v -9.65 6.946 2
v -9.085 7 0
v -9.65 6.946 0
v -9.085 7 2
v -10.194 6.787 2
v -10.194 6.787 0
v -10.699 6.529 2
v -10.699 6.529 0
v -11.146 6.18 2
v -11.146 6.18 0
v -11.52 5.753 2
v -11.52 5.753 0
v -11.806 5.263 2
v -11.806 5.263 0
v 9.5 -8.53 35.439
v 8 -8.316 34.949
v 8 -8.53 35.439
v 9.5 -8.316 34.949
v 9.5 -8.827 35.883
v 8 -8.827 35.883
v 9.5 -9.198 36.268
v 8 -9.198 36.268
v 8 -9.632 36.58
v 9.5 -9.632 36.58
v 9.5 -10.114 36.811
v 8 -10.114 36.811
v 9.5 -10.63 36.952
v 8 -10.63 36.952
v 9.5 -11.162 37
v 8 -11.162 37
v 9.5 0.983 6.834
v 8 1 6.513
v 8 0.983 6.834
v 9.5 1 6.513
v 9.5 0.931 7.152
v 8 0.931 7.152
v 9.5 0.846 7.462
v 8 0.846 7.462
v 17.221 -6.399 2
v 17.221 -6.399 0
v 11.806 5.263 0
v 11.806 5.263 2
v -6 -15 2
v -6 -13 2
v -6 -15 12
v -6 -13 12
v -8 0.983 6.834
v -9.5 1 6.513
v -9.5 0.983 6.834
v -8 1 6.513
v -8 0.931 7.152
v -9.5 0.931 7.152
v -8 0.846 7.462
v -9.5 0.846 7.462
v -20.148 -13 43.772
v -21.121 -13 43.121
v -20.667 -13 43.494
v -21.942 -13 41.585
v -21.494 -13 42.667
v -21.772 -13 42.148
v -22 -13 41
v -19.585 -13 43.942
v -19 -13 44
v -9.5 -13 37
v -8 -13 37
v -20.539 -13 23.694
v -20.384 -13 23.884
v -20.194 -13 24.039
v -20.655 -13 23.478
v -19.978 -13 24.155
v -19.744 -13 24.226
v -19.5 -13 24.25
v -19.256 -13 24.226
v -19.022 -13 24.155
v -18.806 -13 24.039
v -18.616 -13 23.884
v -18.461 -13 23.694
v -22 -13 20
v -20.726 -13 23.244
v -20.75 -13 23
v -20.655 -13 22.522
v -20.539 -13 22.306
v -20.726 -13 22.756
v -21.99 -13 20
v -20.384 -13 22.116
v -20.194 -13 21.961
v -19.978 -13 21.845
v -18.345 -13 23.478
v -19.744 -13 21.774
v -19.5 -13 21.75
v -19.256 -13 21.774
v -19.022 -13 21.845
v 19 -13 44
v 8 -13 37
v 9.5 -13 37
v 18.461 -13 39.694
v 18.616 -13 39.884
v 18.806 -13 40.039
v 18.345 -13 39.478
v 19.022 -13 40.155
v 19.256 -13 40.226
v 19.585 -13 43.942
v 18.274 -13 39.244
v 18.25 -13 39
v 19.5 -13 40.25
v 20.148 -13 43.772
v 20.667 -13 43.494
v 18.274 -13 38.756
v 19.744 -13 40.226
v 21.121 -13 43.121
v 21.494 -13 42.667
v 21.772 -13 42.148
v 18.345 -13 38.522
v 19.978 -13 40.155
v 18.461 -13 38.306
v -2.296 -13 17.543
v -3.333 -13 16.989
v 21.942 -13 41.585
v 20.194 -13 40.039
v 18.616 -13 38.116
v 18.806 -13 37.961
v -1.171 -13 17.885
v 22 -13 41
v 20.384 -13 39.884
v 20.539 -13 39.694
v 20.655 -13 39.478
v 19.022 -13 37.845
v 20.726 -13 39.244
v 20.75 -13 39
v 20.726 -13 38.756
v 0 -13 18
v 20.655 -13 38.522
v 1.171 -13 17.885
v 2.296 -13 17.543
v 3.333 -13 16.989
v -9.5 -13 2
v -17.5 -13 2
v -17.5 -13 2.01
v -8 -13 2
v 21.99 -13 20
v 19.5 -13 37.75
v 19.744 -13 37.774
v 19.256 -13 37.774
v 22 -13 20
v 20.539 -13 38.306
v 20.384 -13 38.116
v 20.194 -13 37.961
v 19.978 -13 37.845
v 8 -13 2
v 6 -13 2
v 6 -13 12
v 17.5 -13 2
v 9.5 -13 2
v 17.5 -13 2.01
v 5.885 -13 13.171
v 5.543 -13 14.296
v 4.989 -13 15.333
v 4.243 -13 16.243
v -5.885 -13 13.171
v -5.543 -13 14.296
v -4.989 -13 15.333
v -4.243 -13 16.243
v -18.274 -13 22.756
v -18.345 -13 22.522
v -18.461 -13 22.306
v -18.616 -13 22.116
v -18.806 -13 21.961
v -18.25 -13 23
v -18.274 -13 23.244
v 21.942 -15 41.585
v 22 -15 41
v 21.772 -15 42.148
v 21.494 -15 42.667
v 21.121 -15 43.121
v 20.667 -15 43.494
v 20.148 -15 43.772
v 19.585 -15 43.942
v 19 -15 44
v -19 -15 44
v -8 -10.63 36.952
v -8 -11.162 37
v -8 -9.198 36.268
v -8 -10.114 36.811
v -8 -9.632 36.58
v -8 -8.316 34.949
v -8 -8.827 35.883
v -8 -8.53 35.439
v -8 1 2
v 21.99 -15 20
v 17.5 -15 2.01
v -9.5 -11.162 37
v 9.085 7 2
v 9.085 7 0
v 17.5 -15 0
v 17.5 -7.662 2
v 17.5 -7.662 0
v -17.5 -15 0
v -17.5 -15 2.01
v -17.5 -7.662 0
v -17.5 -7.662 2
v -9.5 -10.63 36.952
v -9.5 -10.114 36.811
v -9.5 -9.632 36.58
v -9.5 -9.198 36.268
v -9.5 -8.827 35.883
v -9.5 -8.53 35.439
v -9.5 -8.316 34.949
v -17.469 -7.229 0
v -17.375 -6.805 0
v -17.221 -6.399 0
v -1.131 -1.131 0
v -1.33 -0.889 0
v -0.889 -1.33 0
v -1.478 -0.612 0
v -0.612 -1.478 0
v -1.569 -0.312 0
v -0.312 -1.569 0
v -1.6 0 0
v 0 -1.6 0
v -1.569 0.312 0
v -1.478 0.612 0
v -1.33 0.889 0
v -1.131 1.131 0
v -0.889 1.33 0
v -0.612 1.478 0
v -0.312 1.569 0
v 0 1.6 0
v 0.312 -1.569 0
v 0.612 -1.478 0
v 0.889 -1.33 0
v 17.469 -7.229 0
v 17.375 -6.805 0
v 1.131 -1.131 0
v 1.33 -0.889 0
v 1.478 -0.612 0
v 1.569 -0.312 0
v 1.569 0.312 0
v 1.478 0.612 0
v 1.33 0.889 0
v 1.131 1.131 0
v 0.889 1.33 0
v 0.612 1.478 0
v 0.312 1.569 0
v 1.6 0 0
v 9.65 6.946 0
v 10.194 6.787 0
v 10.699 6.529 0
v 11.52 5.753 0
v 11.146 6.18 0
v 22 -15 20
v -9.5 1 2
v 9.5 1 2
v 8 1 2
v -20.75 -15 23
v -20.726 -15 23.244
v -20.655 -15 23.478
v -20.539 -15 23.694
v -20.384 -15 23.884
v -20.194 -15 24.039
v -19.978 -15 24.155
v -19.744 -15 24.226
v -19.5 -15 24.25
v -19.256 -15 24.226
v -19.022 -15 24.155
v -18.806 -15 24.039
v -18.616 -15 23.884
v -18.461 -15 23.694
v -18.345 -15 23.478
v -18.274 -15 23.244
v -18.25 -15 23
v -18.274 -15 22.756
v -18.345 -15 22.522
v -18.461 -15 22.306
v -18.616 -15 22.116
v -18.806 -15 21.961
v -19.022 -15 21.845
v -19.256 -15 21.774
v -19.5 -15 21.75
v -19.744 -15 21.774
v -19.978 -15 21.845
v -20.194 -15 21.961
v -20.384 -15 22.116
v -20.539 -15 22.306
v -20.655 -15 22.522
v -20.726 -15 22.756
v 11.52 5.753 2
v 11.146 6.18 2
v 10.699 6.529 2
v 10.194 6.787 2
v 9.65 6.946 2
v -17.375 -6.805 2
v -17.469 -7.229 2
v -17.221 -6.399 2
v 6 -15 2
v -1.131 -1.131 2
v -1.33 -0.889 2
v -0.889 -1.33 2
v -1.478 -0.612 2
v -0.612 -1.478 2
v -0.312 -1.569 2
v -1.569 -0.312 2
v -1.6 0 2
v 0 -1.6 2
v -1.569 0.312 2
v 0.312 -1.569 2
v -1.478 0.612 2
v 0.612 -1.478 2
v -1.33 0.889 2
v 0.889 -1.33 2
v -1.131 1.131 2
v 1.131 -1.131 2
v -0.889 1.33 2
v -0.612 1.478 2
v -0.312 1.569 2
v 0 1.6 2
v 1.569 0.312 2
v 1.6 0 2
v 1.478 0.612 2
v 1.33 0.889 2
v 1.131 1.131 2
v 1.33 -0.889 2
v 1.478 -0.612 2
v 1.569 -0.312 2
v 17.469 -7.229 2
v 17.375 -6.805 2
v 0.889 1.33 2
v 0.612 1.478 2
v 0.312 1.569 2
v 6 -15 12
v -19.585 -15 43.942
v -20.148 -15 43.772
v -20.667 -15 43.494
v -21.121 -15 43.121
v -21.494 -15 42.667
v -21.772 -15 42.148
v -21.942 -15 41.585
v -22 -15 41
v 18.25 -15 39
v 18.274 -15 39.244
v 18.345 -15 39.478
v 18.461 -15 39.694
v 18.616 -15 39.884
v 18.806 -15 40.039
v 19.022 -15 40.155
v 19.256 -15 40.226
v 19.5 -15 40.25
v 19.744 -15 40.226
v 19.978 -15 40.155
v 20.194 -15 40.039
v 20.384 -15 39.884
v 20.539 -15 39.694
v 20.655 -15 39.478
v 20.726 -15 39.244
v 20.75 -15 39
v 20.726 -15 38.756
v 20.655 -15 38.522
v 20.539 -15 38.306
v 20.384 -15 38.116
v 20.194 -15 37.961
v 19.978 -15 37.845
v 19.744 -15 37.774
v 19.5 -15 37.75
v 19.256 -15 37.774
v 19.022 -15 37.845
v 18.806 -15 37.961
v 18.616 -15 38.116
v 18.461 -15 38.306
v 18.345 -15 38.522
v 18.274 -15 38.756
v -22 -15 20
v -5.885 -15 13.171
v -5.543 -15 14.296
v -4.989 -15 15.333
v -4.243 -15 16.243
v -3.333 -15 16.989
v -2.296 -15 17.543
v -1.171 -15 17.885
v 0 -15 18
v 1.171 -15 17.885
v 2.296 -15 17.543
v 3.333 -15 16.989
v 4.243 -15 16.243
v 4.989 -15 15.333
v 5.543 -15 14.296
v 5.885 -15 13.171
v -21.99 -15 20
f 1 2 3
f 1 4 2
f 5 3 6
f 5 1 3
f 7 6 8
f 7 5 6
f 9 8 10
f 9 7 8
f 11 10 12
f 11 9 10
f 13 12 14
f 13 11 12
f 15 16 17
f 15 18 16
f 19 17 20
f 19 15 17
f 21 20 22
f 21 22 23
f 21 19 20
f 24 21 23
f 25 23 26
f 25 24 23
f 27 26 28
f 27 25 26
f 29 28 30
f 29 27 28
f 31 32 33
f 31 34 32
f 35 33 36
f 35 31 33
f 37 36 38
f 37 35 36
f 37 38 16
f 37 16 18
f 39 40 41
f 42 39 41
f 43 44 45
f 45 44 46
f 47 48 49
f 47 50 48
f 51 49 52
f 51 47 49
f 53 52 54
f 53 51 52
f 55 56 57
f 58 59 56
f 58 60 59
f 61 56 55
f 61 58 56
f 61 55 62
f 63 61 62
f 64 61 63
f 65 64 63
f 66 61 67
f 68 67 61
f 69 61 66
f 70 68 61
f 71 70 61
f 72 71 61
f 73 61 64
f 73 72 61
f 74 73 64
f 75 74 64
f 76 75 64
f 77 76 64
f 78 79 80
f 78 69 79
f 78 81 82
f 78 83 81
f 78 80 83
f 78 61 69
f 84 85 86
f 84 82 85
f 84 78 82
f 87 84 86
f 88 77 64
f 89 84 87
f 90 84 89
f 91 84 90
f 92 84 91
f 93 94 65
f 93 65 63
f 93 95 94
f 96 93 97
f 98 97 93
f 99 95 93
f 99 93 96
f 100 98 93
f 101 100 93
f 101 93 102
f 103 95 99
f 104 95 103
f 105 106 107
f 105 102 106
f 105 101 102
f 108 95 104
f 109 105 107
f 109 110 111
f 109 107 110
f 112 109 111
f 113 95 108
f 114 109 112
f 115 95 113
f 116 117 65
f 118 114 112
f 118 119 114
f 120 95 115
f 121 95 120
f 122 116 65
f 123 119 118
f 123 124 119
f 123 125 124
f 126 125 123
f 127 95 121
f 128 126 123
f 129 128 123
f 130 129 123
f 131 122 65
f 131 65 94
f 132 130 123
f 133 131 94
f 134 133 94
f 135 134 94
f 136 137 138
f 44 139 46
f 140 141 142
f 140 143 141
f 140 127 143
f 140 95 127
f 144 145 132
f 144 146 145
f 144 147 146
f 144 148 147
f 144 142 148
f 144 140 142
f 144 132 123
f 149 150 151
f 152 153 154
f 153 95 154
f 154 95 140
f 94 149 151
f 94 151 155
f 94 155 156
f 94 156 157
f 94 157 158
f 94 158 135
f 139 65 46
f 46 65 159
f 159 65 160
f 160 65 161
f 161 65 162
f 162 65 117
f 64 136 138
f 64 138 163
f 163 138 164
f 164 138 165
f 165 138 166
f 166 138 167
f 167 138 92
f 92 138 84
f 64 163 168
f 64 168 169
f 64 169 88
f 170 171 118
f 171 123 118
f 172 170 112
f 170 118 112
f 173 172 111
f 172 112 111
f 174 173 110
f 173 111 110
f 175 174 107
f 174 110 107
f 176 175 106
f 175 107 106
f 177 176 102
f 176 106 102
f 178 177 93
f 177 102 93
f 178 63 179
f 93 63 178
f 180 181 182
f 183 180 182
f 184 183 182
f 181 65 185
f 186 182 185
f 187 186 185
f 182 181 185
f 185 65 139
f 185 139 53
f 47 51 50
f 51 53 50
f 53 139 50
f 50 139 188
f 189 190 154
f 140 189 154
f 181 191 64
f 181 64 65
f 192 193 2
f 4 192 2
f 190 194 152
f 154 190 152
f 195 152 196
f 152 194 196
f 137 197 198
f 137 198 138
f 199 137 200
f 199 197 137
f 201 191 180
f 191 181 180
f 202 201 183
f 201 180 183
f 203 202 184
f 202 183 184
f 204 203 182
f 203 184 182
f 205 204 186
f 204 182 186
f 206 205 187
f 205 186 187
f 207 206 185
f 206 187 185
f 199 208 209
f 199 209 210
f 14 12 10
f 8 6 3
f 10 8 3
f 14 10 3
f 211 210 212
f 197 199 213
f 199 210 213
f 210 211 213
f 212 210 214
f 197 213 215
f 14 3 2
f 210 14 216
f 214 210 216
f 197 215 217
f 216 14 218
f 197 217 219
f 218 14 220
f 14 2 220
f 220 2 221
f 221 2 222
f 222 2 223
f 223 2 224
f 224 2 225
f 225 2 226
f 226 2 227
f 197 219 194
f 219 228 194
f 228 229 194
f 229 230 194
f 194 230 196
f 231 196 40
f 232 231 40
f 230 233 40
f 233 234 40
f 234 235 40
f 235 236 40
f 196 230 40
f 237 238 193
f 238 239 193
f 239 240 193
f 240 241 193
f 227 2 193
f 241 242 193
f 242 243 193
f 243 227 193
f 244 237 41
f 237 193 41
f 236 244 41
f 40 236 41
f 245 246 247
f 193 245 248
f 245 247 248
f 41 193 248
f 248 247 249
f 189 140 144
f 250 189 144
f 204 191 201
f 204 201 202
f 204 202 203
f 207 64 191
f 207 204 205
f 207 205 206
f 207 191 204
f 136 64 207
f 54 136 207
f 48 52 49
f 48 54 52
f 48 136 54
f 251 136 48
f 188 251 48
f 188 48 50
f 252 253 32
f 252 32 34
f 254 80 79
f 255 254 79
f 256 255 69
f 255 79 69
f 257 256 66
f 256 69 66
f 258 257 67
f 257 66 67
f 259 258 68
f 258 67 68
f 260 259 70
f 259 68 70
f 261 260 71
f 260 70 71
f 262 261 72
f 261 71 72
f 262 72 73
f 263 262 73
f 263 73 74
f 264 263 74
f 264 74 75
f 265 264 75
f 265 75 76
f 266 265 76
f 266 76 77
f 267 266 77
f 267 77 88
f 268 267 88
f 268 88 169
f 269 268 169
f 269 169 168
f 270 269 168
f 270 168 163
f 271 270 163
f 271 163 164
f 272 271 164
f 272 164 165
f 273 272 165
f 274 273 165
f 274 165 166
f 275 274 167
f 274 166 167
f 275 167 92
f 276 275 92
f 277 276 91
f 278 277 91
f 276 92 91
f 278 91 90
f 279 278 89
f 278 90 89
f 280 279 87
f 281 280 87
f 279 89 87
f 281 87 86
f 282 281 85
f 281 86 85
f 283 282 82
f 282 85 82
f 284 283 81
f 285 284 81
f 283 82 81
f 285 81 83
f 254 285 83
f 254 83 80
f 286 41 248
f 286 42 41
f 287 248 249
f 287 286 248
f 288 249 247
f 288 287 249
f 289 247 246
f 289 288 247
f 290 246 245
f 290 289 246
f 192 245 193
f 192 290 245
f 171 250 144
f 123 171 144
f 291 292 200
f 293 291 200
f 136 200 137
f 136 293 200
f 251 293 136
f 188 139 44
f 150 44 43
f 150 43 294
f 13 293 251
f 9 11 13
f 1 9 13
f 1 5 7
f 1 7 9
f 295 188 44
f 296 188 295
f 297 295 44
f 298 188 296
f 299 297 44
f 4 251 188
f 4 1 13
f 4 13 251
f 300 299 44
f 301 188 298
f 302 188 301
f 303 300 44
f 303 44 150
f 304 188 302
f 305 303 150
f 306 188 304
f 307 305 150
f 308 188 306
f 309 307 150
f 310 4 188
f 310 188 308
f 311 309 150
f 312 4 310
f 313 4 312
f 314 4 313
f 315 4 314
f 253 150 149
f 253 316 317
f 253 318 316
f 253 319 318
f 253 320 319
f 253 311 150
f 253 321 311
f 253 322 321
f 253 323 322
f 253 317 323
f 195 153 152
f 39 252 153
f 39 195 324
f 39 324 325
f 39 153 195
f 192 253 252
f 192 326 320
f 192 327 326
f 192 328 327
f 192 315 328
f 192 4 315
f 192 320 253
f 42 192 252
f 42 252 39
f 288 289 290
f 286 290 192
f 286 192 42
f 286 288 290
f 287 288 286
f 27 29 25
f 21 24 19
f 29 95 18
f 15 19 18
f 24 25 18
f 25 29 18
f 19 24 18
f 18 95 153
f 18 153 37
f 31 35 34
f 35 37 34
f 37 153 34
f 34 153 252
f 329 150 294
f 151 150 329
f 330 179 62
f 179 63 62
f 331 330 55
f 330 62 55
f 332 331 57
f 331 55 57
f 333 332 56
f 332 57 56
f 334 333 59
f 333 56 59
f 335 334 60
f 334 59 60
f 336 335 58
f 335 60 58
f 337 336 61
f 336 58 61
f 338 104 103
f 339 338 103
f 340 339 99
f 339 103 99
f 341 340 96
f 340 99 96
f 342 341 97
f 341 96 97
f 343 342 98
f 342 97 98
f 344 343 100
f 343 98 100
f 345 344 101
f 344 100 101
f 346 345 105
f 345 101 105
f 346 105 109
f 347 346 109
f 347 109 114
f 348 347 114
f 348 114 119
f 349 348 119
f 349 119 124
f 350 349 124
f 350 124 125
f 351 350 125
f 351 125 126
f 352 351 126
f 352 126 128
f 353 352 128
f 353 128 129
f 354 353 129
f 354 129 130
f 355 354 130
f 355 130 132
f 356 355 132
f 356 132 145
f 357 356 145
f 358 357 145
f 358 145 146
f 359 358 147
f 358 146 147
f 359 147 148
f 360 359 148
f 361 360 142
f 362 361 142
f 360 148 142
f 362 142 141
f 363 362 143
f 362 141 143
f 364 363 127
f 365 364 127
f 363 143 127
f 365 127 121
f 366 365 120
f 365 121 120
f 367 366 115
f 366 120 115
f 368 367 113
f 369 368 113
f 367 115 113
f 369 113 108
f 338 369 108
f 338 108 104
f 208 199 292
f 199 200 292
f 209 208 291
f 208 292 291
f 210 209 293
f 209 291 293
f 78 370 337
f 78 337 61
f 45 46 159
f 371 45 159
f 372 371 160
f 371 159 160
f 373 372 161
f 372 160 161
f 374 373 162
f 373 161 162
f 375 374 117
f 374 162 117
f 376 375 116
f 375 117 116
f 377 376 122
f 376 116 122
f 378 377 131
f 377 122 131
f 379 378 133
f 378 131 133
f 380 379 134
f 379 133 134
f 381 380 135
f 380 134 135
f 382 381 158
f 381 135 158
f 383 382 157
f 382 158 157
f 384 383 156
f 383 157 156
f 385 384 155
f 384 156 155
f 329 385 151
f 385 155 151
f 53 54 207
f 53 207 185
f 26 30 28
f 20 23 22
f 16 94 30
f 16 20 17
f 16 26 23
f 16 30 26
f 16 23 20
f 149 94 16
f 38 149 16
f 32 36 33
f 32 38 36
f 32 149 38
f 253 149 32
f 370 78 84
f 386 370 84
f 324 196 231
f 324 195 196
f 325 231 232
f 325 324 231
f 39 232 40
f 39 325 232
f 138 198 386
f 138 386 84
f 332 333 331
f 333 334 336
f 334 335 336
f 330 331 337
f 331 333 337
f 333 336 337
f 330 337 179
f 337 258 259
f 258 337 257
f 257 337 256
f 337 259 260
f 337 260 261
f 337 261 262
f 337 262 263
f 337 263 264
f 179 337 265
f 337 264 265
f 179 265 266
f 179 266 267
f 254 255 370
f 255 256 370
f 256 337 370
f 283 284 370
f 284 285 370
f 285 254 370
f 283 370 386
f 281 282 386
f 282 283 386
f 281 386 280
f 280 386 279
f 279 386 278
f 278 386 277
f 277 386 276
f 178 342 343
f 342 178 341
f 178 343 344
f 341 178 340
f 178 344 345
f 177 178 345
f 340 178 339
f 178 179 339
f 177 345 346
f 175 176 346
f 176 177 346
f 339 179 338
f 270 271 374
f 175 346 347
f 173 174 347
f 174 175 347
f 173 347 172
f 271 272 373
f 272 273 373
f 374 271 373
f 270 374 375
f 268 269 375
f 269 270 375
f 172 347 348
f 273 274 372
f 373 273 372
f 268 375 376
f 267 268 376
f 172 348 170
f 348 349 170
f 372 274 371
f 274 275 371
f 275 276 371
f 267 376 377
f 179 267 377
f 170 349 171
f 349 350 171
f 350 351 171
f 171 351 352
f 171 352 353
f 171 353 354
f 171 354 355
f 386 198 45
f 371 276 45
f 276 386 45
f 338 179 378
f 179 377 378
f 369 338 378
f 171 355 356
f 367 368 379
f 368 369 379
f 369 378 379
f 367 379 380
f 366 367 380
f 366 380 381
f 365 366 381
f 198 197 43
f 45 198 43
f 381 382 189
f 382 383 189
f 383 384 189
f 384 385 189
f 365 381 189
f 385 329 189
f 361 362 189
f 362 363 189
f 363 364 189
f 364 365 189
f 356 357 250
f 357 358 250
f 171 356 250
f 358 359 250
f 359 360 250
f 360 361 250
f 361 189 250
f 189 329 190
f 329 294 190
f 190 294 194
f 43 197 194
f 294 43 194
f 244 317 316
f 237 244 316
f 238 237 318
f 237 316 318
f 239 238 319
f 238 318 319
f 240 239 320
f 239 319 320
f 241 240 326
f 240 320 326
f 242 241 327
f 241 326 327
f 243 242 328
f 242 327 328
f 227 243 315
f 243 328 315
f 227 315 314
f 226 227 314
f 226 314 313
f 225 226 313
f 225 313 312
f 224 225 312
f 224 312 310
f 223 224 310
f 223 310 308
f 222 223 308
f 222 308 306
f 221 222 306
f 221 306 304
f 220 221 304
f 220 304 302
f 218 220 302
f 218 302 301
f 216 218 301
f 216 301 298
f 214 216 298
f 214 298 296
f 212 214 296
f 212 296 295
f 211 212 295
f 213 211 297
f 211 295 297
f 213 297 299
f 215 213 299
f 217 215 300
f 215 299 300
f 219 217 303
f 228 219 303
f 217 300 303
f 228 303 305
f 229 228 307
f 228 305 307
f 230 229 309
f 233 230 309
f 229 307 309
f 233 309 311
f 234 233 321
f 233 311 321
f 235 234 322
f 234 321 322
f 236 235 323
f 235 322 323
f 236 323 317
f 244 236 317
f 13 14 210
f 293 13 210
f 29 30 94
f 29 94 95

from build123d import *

# Parameters (mm, degrees)
PAD_DEPTH          = 2
SKETCH001_W        = 35
SKETCH001_H        = 2
PAD001_DEPTH       = 18
SKETCH002_W        = 44
SKETCH002_H        = 2
PAD002_DEPTH       = 24
CHAMFER_1_SIZE2    = 17.99
CHAMFER_1_SIZE     = 4.49
CHAMFER_2_SIZE2    = 17.99
CHAMFER_2_SIZE     = 4.49
FILLET_R           = 3
SKETCH003_R        = 1.25
POCKET_DEPTH       = 5
SKETCH004_R        = 1.6
POCKET001_DEPTH    = 5
SKETCH005_W        = 1.5
SKETCH005_H        = 14
PAD003_DEPTH       = 35
CHAMFER001_1_SIZE2 = 30
CHAMFER001_1_SIZE  = 10
CHAMFER001_2_SIZE2 = 30
CHAMFER001_2_SIZE  = 10
FILLET001_R        = 3
POCKET002_DEPTH    = 5


with BuildPart() as part:
    # Sketch → Pad (new body)
    with BuildSketch(Plane.XY):
        Polygon((-17.5, -15), (17.5, -15), (17.5, -7), (11, 7), (-11, 7), (-17.5, -7), align=None)
    extrude(amount=PAD_DEPTH)

    # Sketch001 (on Face8 of Pad) → Pad001 (join)
    with BuildSketch(Plane.XY.offset(2)):
        with Locations((0, -14)):
            Rectangle(SKETCH001_W, SKETCH001_H)
    extrude(amount=PAD001_DEPTH)

    # Sketch002 (on Face12 of Pad001) → Pad002 (join)
    with BuildSketch(Plane.XY.offset(20)):
        with Locations((0, -14)):
            Rectangle(SKETCH002_W, SKETCH002_H)
    extrude(amount=PAD002_DEPTH)

    # Chamfer 1
    chamfer_1_edges = [part.edges().sort_by_distance(p)[0] for p in [
        (-17.5, -14, 20),
    ]]
    chamfer_1_side = part.faces().sort_by_distance((-19.75, -14, 20))[0]
    chamfer(chamfer_1_edges, length=CHAMFER_1_SIZE, length2=CHAMFER_1_SIZE2, reference=chamfer_1_side)

    # Chamfer 2
    chamfer_2_edges = [part.edges().sort_by_distance(p)[0] for p in [
        (17.5, -14, 20),
    ]]
    chamfer_2_side = part.faces().sort_by_distance((19.75, -14, 20))[0]
    chamfer(chamfer_2_edges, length=CHAMFER_2_SIZE, length2=CHAMFER_2_SIZE2, reference=chamfer_2_side)

    # Fillet
    fillet_edges = [part.edges().sort_by_distance(p)[0] for p in [
        (22, -14, 44),
        (17.5, -7, 1),
        (11, 7, 1),
        (-11, 7, 1),
        (-17.5, -7, 1),
        (-22, -14, 44),
    ]]
    fillet(fillet_edges, radius=FILLET_R)

    # Sketch003 (on Face1 of Fillet) → Pocket (cut)
    with BuildSketch(Plane(origin=(0, -13, 0), x_dir=(-1, 0, 0), z_dir=(0, 1, 0))):
        with Locations((-19.5, 39)):
            Circle(SKETCH003_R)
        with Locations((19.5, 23)):
            Circle(SKETCH003_R)
    extrude(amount=-POCKET_DEPTH, mode=Mode.SUBTRACT)

    # Sketch004 (on Face16 of Pocket) → Pocket001 (cut)
    with BuildSketch(Plane.XY.offset(2)):
        Circle(SKETCH004_R)
    extrude(amount=-POCKET001_DEPTH, mode=Mode.SUBTRACT)

    # Sketch005 (on Face16 of Pocket001) → Pad003 (join)
    with BuildSketch(Plane.XY.offset(2)):
        with Locations((-8.75, -6)):
            Rectangle(SKETCH005_W, SKETCH005_H)
        with Locations((8.75, -6)):
            Rectangle(SKETCH005_W, SKETCH005_H)
    extrude(amount=PAD003_DEPTH)

    # Chamfer001 1
    chamfer001_1_edges = [part.edges().sort_by_distance(p)[0] for p in [
        (-8.75, 1, 37),
    ]]
    chamfer001_1_side = part.faces().sort_by_distance((-8.75, -6, 37))[0]
    chamfer(chamfer001_1_edges, length=CHAMFER001_1_SIZE, length2=CHAMFER001_1_SIZE2, reference=chamfer001_1_side)

    # Chamfer001 2
    chamfer001_2_edges = [part.edges().sort_by_distance(p)[0] for p in [
        (8.75, 1, 37),
    ]]
    chamfer001_2_side = part.faces().sort_by_distance((8.75, -6, 37))[0]
    chamfer(chamfer001_2_edges, length=CHAMFER001_2_SIZE, length2=CHAMFER001_2_SIZE2, reference=chamfer001_2_side)

    # Fillet001
    fillet001_edges = [part.edges().sort_by_distance(p)[0] for p in [
        (8.75, -9, 37),
        (-8.75, -9, 37),
        (-8.75, 1, 7),
        (8.75, 1, 7),
    ]]
    fillet(fillet001_edges, radius=FILLET001_R)

    # Sketch006 (on Face23 of Fillet001) → Pocket002 (cut)
    with BuildSketch(Plane(origin=(0, -13, 0), x_dir=(-1, 0, 0), z_dir=(0, 1, 0))):
        with BuildLine():
            Line((-6, 2), (-6, 12))
            ThreePointArc((6, 12), (0, 18), (-6, 12))
            Line((6, 2), (6, 12))
            Line((-6, 2), (6, 2))
        make_face()
    extrude(amount=-POCKET002_DEPTH, mode=Mode.SUBTRACT)


solid = part.part
